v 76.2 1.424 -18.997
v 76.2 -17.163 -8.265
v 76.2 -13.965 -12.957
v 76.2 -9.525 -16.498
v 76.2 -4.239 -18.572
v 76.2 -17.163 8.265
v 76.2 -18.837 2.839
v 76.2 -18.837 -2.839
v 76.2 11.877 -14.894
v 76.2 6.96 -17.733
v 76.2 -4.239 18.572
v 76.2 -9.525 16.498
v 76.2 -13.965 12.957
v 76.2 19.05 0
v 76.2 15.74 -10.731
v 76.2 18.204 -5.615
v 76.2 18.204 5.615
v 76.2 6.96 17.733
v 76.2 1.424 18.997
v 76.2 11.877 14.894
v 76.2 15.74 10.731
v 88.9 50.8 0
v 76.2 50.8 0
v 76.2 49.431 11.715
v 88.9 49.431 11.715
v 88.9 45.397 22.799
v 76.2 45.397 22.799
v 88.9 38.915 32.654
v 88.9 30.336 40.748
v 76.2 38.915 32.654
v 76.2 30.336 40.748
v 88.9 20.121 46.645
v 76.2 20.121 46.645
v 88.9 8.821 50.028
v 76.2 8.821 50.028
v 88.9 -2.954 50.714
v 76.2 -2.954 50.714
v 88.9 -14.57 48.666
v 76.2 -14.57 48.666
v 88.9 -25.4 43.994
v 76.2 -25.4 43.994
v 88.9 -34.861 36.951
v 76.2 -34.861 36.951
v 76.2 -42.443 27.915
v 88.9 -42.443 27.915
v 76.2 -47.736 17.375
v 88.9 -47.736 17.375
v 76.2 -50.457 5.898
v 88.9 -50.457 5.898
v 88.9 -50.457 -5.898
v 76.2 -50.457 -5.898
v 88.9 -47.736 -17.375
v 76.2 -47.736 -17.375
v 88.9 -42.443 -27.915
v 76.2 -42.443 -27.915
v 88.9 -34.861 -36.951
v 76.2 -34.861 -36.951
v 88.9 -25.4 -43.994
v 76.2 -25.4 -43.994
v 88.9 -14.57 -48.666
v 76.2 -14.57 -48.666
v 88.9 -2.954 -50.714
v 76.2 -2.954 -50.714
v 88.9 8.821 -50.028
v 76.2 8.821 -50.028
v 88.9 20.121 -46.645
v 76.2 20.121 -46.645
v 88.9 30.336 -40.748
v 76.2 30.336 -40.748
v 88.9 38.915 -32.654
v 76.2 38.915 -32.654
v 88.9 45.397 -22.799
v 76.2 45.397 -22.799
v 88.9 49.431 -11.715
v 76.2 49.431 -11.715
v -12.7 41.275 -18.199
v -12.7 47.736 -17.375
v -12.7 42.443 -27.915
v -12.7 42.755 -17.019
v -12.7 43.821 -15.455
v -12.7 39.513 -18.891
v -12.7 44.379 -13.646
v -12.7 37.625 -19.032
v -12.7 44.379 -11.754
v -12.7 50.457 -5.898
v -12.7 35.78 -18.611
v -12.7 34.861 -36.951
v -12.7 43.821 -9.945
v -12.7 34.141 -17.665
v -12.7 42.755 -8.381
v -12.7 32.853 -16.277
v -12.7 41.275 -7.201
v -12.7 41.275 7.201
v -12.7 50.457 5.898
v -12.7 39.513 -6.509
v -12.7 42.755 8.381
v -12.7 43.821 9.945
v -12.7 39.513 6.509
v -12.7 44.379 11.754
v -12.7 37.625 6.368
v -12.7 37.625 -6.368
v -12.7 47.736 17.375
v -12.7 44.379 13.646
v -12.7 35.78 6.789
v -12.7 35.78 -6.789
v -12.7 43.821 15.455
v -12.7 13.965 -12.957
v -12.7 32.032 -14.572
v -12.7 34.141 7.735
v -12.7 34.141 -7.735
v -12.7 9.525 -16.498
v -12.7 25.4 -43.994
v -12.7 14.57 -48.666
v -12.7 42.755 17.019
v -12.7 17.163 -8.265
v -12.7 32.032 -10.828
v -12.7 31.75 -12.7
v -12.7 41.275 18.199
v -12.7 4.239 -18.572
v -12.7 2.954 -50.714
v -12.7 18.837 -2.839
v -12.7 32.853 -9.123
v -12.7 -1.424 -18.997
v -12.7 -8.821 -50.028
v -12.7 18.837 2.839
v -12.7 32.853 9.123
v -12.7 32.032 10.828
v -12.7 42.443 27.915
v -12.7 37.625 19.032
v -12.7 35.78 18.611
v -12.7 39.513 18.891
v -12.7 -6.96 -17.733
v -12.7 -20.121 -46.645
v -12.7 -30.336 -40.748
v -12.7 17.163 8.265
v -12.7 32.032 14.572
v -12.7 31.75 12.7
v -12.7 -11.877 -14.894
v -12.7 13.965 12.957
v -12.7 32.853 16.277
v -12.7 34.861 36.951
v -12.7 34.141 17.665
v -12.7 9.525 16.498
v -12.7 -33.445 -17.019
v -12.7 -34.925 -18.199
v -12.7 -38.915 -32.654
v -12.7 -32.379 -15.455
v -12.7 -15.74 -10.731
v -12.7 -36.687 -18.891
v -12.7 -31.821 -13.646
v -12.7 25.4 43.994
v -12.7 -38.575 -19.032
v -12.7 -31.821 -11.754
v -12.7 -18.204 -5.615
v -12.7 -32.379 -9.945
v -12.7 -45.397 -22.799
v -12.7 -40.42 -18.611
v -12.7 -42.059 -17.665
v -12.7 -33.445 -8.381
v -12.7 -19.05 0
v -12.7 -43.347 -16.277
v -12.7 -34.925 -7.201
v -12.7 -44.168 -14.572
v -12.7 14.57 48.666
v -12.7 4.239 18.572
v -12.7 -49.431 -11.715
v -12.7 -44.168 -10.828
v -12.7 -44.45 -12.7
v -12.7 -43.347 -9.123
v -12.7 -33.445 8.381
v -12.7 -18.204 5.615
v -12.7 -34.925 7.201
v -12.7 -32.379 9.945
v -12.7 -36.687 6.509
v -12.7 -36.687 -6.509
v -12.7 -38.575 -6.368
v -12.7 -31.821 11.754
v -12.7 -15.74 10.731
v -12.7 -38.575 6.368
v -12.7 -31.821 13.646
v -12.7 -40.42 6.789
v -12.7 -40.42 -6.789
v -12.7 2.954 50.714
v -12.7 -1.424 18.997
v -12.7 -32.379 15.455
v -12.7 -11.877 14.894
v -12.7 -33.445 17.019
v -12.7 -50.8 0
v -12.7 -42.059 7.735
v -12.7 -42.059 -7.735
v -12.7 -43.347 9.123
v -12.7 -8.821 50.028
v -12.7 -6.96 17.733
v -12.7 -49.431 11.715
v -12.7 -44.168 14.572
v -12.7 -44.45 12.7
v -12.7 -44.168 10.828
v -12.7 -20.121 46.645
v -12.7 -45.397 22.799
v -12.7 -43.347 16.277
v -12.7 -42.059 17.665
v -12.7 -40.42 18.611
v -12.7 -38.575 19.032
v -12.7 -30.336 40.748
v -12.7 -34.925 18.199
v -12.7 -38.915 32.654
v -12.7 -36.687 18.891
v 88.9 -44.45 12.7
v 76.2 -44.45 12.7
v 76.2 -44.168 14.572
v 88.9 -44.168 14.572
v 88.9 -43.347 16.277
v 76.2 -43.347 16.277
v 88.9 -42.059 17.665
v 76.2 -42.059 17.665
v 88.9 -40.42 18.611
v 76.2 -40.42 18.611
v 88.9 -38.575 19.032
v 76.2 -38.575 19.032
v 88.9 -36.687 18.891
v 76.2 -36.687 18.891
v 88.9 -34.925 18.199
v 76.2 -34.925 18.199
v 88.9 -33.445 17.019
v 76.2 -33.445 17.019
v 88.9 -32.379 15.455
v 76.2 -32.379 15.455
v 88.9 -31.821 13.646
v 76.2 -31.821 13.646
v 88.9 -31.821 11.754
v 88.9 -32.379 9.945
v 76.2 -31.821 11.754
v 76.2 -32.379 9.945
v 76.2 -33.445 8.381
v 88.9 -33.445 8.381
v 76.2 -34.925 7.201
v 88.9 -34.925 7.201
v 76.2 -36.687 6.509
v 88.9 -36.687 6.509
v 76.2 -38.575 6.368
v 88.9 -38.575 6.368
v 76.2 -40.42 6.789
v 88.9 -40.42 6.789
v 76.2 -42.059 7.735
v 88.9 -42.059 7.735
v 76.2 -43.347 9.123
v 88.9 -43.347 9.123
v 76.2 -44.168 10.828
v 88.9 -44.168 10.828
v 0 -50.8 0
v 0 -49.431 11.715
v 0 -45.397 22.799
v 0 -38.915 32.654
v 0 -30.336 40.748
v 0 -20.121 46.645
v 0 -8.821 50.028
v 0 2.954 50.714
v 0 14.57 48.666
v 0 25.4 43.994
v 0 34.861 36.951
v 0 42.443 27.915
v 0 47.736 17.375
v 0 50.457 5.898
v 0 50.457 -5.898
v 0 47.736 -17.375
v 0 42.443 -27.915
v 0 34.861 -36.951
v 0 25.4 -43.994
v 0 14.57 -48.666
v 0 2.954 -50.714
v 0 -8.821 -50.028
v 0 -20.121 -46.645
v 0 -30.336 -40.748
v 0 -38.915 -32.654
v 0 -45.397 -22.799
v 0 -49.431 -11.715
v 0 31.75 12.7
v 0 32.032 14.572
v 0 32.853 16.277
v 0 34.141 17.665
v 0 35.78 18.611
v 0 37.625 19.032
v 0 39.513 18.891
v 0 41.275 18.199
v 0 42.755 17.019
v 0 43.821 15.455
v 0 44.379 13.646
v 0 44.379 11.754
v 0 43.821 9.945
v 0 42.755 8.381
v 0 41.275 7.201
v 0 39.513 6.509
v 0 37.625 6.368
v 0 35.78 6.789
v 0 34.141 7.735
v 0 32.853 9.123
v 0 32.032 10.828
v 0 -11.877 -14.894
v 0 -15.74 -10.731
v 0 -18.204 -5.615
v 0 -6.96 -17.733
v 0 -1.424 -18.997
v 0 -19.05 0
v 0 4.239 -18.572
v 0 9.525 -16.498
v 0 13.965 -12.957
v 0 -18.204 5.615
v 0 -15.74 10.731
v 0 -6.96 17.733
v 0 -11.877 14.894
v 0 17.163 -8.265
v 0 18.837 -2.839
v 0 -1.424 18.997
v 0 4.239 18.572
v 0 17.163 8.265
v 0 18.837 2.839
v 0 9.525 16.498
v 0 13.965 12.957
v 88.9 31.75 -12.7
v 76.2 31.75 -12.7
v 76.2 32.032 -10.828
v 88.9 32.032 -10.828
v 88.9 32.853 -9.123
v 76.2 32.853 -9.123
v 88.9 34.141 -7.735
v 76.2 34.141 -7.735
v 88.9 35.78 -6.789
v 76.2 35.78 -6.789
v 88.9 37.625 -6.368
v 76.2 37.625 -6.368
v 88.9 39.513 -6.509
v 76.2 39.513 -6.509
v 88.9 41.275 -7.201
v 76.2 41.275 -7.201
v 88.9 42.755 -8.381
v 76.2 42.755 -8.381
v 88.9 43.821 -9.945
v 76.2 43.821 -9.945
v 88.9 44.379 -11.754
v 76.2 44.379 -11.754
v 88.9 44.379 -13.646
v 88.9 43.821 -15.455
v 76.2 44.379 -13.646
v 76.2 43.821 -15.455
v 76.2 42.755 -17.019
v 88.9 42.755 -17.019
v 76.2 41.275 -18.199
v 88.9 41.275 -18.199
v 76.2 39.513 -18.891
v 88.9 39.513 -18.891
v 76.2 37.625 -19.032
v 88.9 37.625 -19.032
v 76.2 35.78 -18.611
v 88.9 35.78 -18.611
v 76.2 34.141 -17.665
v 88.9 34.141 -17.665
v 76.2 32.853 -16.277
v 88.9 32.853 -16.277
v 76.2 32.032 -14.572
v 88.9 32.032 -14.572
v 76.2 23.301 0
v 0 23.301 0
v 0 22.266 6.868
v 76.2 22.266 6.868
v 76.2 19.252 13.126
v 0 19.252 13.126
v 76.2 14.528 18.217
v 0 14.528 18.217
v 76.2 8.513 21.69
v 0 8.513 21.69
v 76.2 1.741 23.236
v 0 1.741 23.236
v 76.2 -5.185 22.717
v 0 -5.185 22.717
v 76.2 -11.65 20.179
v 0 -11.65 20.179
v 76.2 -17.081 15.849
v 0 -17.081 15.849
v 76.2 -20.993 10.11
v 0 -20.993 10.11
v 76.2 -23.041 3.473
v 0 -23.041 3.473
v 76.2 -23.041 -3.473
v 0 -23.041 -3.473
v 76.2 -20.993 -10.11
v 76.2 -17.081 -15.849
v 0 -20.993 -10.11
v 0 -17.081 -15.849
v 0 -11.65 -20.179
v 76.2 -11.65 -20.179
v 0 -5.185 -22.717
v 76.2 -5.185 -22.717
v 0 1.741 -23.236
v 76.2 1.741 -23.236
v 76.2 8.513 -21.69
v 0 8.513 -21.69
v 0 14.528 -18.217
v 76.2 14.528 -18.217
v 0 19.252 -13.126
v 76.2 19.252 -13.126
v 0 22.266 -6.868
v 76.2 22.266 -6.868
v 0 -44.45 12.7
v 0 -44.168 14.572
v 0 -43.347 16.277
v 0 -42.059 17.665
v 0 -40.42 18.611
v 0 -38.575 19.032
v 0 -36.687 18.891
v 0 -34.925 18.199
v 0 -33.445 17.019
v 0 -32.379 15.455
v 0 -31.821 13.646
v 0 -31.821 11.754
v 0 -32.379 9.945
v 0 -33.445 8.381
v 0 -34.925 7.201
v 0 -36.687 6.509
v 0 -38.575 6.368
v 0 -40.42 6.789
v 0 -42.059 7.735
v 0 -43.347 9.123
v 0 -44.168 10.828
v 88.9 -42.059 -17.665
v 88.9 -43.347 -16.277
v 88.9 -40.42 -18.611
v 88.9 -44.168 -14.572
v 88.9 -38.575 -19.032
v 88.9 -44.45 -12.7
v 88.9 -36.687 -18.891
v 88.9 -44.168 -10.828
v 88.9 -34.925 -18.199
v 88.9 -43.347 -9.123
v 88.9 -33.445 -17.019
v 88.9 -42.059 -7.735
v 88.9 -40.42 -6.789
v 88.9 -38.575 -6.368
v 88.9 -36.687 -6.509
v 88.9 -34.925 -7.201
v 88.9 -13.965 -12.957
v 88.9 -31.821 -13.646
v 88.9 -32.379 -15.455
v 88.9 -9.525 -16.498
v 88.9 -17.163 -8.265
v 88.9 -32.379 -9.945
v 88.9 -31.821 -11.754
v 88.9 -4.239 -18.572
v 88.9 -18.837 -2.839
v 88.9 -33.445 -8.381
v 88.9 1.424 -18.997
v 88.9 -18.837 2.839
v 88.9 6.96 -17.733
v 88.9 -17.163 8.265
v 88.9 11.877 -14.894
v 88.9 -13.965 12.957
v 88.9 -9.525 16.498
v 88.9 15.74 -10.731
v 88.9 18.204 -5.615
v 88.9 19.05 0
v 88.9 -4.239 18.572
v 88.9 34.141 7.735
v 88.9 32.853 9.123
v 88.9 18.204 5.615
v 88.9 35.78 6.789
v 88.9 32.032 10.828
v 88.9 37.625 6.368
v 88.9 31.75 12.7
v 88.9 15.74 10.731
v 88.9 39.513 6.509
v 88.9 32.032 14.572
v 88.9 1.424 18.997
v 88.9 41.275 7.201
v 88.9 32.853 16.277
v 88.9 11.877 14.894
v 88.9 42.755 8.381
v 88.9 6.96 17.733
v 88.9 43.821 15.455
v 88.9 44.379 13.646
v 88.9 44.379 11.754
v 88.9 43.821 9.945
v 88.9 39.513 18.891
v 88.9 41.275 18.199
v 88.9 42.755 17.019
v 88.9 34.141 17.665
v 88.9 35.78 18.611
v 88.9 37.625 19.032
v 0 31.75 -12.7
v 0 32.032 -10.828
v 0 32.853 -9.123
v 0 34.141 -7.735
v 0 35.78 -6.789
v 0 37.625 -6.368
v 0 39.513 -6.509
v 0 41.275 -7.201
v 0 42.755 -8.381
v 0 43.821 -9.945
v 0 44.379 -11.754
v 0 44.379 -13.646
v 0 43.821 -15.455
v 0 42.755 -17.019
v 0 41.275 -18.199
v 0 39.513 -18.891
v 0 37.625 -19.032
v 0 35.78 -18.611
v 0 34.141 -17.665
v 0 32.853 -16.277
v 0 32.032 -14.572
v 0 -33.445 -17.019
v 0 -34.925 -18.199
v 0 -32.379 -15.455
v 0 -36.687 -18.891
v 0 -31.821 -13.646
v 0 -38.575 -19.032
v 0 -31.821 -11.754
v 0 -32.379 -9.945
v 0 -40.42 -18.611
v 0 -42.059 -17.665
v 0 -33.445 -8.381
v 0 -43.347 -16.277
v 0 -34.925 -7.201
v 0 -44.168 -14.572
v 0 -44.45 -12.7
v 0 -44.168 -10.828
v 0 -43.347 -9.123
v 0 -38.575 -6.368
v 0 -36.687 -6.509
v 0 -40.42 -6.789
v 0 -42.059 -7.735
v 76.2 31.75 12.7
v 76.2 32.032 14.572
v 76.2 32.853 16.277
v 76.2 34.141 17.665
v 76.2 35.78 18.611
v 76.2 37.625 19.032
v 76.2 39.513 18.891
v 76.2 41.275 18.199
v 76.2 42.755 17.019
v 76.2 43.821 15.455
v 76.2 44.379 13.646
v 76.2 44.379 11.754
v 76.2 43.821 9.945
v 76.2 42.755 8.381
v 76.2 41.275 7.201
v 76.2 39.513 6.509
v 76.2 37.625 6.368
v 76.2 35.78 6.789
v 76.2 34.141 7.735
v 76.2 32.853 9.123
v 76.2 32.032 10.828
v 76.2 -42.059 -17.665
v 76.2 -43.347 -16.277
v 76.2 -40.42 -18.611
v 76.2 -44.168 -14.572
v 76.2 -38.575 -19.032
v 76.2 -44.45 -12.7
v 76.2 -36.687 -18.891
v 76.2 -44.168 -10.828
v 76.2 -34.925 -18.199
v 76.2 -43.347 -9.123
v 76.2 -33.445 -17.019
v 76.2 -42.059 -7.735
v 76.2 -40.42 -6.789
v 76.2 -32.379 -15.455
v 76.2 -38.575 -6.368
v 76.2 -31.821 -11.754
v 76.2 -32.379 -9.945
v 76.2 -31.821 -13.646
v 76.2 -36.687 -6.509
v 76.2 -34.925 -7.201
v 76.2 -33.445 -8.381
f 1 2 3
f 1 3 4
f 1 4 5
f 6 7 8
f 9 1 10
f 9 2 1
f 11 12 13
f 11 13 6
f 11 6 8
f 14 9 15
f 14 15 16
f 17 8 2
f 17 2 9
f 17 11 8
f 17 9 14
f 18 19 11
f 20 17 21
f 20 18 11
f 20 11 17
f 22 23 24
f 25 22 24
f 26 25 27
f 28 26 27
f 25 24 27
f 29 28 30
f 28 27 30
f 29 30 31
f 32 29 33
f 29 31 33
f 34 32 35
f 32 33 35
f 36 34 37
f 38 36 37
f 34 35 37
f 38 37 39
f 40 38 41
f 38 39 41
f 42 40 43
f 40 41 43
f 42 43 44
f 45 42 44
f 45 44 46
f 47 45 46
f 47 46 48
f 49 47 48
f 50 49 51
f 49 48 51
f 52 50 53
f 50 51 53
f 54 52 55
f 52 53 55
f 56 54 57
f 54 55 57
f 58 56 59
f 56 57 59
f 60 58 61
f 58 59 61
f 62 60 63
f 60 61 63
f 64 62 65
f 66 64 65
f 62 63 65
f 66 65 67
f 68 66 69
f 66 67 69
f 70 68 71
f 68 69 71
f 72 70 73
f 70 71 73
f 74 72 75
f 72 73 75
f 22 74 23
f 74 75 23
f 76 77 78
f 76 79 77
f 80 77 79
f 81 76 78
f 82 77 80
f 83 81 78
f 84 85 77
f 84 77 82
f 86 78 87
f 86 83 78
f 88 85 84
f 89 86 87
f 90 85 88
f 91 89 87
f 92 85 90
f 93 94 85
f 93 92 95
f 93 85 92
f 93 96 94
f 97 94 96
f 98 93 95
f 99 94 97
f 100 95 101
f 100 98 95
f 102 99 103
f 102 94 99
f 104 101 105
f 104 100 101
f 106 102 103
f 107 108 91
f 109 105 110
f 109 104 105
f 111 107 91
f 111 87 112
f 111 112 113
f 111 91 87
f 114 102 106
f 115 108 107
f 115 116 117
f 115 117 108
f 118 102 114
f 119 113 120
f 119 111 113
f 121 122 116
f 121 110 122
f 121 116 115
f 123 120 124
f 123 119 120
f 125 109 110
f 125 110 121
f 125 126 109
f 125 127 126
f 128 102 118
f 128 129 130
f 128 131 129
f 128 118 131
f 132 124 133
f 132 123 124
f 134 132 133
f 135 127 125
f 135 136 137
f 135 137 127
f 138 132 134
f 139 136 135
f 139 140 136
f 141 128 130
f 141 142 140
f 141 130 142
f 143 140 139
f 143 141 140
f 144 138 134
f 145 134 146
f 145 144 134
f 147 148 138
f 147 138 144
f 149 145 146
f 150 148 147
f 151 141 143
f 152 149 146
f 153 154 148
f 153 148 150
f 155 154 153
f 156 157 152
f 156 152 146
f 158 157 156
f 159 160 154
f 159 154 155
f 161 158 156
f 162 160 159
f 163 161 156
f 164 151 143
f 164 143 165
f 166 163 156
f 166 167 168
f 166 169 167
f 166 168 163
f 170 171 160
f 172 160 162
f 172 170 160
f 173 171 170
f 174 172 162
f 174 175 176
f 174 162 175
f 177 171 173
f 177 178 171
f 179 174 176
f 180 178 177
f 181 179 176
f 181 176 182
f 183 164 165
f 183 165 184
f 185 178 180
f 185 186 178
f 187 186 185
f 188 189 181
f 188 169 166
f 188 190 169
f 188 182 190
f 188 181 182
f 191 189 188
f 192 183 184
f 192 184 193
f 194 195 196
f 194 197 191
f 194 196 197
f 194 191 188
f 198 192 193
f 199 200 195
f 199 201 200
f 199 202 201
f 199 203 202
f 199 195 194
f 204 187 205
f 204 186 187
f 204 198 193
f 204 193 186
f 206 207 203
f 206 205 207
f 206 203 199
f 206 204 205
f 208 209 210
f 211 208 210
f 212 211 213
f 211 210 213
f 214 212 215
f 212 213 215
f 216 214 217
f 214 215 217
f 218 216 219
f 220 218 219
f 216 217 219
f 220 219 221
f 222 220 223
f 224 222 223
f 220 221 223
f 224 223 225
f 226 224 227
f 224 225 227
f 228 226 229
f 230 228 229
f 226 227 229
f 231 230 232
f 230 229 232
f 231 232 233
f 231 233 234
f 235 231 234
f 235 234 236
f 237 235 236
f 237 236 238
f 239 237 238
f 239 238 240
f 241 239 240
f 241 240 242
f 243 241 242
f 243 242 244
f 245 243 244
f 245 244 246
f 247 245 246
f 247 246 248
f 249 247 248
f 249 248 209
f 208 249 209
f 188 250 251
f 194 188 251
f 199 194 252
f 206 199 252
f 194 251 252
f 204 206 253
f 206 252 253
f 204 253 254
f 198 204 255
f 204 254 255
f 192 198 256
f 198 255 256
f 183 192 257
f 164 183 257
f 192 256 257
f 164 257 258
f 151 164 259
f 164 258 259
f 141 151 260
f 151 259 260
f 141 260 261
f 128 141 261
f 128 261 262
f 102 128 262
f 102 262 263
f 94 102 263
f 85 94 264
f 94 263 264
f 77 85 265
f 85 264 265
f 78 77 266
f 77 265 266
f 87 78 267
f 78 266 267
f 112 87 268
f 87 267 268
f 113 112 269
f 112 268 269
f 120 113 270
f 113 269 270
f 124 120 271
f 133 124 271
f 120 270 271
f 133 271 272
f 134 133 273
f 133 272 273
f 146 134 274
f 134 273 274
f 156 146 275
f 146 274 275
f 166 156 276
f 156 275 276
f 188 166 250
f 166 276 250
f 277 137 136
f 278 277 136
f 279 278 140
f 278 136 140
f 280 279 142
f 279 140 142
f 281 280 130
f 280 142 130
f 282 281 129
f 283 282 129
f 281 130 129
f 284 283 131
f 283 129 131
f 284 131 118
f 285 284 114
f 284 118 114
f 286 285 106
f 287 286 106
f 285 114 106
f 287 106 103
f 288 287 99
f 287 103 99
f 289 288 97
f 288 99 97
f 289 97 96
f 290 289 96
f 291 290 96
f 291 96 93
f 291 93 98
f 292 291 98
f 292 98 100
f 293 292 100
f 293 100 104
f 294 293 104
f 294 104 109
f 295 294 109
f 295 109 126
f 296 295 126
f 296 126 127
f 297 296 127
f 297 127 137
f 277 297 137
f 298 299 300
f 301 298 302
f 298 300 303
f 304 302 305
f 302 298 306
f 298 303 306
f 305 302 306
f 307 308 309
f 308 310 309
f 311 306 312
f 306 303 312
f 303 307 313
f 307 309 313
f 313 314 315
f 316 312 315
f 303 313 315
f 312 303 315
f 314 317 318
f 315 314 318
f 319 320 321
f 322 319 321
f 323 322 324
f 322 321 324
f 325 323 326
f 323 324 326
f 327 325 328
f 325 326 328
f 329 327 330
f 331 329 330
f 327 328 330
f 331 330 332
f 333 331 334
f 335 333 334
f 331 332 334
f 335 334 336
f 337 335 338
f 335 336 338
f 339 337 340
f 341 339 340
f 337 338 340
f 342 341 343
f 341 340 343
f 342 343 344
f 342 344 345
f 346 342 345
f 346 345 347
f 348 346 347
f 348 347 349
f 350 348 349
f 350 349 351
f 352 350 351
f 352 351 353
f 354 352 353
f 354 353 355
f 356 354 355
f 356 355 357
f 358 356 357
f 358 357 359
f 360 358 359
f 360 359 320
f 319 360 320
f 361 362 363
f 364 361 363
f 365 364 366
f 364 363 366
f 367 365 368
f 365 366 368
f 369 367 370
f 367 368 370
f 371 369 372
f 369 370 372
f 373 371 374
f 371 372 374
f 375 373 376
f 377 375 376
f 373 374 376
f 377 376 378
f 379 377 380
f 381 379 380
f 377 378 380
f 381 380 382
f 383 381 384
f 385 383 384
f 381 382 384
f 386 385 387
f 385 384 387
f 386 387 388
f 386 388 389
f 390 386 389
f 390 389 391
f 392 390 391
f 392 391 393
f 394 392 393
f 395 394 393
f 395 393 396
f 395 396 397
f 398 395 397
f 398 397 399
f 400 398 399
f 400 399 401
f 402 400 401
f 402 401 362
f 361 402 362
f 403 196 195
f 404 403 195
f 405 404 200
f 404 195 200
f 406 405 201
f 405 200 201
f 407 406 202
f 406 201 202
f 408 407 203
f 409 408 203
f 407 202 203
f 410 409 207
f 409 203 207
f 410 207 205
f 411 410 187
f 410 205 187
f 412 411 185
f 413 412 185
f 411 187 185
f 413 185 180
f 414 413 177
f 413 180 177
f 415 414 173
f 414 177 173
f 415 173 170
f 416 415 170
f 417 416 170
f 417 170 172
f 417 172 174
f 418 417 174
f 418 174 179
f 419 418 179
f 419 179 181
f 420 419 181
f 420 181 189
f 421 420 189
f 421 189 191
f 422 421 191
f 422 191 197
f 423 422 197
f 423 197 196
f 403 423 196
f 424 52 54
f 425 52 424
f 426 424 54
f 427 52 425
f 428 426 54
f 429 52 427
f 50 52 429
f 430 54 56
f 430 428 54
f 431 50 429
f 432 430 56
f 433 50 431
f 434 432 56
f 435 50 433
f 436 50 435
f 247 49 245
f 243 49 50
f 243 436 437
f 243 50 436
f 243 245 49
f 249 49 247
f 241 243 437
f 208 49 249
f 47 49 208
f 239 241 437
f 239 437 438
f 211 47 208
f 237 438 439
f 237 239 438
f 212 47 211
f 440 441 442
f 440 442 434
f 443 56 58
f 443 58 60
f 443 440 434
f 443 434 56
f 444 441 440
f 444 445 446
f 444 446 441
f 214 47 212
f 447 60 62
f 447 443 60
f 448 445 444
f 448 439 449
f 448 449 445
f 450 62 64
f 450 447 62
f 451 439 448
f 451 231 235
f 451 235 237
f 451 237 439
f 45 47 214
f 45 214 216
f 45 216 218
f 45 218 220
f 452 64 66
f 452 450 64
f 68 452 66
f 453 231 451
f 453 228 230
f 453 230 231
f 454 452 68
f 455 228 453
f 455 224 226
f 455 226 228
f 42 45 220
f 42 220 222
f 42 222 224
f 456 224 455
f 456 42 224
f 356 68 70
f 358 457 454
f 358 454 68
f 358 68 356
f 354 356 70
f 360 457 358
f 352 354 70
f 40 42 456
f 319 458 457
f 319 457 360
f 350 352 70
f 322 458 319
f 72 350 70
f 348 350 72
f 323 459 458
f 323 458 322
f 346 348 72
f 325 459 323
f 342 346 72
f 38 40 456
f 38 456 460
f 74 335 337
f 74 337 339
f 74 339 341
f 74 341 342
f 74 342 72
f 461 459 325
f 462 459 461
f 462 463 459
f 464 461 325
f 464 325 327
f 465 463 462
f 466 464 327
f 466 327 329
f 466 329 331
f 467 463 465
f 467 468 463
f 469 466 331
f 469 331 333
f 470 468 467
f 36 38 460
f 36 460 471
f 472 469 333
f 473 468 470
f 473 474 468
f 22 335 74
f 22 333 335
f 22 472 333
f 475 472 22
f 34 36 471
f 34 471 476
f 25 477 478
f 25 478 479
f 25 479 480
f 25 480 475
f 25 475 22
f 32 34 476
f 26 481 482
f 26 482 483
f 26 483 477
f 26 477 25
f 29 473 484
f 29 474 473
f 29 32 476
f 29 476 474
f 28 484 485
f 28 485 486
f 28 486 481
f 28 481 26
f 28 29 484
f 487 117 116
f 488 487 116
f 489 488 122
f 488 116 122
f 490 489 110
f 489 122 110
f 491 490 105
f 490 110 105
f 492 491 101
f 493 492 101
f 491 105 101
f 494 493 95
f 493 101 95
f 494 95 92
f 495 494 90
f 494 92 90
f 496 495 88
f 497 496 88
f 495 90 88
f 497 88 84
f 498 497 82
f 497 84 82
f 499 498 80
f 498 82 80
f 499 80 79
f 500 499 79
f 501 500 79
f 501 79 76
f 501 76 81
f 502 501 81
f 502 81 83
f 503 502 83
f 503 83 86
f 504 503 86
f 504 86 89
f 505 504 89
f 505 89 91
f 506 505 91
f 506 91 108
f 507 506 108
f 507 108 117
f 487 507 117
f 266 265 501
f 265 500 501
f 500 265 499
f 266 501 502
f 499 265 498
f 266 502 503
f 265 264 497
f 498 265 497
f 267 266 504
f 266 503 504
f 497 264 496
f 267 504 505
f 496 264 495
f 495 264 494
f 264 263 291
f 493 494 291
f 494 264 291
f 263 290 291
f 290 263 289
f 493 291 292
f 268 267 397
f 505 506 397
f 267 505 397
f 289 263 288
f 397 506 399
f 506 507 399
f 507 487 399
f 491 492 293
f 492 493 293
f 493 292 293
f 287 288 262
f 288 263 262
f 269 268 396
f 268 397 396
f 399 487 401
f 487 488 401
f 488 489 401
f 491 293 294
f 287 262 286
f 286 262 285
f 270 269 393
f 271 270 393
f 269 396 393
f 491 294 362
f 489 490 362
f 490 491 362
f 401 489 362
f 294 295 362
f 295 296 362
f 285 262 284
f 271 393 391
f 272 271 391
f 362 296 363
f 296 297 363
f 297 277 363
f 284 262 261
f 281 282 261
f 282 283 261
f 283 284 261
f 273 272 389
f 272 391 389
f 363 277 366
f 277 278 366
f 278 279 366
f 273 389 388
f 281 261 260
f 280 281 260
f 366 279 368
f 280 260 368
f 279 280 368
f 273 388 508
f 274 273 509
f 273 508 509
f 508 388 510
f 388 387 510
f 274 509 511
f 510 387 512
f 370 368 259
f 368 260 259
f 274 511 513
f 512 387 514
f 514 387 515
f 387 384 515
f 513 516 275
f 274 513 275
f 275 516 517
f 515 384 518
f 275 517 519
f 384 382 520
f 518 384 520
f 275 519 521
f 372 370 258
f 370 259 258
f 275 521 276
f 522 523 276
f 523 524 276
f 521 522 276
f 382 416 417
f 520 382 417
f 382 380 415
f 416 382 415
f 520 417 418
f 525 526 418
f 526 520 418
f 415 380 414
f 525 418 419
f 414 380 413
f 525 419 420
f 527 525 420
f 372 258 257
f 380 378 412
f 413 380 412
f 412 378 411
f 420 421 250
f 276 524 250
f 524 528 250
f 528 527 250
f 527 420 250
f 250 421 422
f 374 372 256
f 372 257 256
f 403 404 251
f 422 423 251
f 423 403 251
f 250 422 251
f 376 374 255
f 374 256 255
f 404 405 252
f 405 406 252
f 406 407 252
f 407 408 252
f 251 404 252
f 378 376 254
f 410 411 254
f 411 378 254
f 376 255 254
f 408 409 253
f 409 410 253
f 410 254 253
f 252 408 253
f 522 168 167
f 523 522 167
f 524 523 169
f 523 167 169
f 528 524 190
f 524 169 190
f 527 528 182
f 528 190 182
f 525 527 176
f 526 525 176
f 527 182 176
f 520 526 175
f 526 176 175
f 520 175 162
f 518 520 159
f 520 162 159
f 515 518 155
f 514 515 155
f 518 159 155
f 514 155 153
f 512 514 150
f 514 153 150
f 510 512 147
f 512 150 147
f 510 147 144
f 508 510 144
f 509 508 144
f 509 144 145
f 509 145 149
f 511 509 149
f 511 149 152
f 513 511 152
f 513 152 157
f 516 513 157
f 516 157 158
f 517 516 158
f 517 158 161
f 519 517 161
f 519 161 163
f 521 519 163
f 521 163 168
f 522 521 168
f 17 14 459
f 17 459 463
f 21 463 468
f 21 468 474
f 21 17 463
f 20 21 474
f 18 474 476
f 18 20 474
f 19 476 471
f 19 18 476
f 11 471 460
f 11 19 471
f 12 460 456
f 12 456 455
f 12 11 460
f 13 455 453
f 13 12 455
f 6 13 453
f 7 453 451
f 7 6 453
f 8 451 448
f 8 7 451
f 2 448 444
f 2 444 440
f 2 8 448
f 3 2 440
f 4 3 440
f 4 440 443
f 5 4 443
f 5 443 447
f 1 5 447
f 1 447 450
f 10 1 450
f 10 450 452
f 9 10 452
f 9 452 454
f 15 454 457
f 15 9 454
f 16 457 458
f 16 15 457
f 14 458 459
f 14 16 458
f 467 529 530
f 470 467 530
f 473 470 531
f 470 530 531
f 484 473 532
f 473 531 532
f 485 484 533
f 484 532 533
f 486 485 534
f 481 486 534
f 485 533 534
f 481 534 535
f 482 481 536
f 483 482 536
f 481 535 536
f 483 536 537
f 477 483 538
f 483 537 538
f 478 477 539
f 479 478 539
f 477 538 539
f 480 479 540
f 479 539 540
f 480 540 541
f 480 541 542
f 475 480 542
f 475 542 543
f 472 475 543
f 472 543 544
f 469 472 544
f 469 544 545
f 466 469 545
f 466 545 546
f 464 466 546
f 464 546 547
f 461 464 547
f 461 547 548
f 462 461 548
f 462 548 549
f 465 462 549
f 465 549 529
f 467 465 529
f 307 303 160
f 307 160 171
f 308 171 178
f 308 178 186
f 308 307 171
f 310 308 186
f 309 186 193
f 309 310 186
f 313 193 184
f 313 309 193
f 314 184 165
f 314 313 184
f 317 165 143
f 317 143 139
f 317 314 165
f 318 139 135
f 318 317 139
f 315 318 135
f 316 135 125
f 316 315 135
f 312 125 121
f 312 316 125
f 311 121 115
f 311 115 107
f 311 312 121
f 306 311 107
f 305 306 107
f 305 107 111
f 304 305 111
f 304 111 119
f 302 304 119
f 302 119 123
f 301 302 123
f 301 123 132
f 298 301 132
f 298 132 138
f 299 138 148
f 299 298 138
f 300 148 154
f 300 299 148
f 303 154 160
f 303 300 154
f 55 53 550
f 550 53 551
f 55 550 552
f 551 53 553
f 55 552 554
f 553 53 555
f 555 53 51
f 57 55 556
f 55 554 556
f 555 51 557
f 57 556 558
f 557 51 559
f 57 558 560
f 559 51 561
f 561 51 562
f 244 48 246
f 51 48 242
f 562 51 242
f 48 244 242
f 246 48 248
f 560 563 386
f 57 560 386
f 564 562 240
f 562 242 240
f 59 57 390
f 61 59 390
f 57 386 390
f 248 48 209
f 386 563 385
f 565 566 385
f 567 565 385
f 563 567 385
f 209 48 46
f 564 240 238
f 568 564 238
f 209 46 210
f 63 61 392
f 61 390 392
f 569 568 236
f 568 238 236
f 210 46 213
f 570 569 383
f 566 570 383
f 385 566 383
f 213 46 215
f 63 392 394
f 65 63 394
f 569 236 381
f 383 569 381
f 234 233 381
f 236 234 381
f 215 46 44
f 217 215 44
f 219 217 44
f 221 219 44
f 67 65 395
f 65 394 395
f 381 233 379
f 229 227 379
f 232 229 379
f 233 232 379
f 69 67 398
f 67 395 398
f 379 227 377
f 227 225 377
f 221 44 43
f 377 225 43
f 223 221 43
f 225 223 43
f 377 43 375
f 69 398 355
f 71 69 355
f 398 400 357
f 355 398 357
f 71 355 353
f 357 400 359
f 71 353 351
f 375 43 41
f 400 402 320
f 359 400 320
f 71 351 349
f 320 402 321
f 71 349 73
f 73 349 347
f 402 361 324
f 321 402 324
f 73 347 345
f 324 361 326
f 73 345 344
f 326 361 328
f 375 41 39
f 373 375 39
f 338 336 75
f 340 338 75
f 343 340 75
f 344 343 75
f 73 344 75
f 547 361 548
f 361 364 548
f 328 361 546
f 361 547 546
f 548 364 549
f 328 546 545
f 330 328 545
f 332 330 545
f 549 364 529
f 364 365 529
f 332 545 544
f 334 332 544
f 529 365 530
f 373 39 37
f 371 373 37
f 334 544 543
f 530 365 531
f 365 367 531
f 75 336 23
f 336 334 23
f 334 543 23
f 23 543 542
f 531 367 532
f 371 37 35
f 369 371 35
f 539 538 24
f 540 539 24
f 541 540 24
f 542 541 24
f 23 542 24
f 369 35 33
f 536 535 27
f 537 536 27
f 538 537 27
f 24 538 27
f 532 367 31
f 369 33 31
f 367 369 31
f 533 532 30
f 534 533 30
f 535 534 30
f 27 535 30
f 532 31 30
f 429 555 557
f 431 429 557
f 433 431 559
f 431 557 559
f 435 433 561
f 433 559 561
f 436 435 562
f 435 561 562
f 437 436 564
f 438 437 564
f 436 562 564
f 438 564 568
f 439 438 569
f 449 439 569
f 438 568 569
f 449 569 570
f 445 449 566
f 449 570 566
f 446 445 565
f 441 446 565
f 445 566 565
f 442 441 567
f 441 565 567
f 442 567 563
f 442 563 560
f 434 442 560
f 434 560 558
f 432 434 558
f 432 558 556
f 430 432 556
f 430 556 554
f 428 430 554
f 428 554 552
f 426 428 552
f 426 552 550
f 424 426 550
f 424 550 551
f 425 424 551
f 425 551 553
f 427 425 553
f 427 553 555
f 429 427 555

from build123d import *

# Parameters (mm, degrees)
F0_R      = 23.300807
F1_DEPTH  = 76.2
F3_R      = 50.8
F3_R_2    = 23.300807
F4_DEPTH  = 12.7
F6_R      = 50.8
F6_R_2    = 23.300807
F7_DEPTH  = 12.7
F8_R      = 23.300807
F8_R_2    = 19.05
F9_DEPTH  = 12.7
F10_R     = 23.300807
F10_R_2   = 19.05
F11_DEPTH = 12.7
F12_R     = 6.35
F13_DEPTH = 2540


with BuildPart() as f1:
    # F0 (on Right) → F1 (new body)
    with BuildSketch(Plane.YZ):
        Circle(F0_R)
    extrude(amount=F1_DEPTH)



with BuildPart() as f4:
    # F3 (on face) → F4 (new body)
    with BuildSketch(Plane(origin=(0, 0, 0), x_dir=(0, -1, 0), z_dir=(-1, 0, 0))):
        Circle(F3_R)
        Circle(F3_R_2, mode=Mode.SUBTRACT)
    extrude(amount=F4_DEPTH)


with BuildPart() as f7:
    # F6 (on face) → F7 (new body)
    with BuildSketch(Plane.YZ.offset(76.2)):
        Circle(F6_R)
        Circle(F6_R_2, mode=Mode.SUBTRACT)
    extrude(amount=F7_DEPTH)


with BuildPart() as f1_1:
    add(f1.part)

    add(f7.part)  # F9 merges F7
    # F8 (on face) → F9 (join)
    with BuildSketch(Plane.YZ.offset(76.2)):
        Circle(F8_R)
        Circle(F8_R_2, mode=Mode.SUBTRACT)
    extrude(amount=F9_DEPTH)


    add(f4.part)  # F11 merges F4
    # F10 (on face) → F11 (join)
    with BuildSketch(Plane(origin=(0, 0, 0), x_dir=(0, -1, 0), z_dir=(-1, 0, 0))):
        Circle(F10_R)
        Circle(F10_R_2, mode=Mode.SUBTRACT)
    extrude(amount=F11_DEPTH)

    # F12 (on face) → F13 (cut)
    with BuildSketch(Plane(origin=(-12.7, 0, 0), x_dir=(0, -1, 0), z_dir=(-1, 0, 0))):
        with Locations((-38.1, 12.7)):
            Circle(F12_R)
        with Locations((-38.1, -12.7)):
            Circle(F12_R)
        with Locations((38.1, -12.7)):
            Circle(F12_R)
        with Locations((38.1, 12.7)):
            Circle(F12_R)
    extrude(amount=-F13_DEPTH, mode=Mode.SUBTRACT)


solid = f1_1.part
